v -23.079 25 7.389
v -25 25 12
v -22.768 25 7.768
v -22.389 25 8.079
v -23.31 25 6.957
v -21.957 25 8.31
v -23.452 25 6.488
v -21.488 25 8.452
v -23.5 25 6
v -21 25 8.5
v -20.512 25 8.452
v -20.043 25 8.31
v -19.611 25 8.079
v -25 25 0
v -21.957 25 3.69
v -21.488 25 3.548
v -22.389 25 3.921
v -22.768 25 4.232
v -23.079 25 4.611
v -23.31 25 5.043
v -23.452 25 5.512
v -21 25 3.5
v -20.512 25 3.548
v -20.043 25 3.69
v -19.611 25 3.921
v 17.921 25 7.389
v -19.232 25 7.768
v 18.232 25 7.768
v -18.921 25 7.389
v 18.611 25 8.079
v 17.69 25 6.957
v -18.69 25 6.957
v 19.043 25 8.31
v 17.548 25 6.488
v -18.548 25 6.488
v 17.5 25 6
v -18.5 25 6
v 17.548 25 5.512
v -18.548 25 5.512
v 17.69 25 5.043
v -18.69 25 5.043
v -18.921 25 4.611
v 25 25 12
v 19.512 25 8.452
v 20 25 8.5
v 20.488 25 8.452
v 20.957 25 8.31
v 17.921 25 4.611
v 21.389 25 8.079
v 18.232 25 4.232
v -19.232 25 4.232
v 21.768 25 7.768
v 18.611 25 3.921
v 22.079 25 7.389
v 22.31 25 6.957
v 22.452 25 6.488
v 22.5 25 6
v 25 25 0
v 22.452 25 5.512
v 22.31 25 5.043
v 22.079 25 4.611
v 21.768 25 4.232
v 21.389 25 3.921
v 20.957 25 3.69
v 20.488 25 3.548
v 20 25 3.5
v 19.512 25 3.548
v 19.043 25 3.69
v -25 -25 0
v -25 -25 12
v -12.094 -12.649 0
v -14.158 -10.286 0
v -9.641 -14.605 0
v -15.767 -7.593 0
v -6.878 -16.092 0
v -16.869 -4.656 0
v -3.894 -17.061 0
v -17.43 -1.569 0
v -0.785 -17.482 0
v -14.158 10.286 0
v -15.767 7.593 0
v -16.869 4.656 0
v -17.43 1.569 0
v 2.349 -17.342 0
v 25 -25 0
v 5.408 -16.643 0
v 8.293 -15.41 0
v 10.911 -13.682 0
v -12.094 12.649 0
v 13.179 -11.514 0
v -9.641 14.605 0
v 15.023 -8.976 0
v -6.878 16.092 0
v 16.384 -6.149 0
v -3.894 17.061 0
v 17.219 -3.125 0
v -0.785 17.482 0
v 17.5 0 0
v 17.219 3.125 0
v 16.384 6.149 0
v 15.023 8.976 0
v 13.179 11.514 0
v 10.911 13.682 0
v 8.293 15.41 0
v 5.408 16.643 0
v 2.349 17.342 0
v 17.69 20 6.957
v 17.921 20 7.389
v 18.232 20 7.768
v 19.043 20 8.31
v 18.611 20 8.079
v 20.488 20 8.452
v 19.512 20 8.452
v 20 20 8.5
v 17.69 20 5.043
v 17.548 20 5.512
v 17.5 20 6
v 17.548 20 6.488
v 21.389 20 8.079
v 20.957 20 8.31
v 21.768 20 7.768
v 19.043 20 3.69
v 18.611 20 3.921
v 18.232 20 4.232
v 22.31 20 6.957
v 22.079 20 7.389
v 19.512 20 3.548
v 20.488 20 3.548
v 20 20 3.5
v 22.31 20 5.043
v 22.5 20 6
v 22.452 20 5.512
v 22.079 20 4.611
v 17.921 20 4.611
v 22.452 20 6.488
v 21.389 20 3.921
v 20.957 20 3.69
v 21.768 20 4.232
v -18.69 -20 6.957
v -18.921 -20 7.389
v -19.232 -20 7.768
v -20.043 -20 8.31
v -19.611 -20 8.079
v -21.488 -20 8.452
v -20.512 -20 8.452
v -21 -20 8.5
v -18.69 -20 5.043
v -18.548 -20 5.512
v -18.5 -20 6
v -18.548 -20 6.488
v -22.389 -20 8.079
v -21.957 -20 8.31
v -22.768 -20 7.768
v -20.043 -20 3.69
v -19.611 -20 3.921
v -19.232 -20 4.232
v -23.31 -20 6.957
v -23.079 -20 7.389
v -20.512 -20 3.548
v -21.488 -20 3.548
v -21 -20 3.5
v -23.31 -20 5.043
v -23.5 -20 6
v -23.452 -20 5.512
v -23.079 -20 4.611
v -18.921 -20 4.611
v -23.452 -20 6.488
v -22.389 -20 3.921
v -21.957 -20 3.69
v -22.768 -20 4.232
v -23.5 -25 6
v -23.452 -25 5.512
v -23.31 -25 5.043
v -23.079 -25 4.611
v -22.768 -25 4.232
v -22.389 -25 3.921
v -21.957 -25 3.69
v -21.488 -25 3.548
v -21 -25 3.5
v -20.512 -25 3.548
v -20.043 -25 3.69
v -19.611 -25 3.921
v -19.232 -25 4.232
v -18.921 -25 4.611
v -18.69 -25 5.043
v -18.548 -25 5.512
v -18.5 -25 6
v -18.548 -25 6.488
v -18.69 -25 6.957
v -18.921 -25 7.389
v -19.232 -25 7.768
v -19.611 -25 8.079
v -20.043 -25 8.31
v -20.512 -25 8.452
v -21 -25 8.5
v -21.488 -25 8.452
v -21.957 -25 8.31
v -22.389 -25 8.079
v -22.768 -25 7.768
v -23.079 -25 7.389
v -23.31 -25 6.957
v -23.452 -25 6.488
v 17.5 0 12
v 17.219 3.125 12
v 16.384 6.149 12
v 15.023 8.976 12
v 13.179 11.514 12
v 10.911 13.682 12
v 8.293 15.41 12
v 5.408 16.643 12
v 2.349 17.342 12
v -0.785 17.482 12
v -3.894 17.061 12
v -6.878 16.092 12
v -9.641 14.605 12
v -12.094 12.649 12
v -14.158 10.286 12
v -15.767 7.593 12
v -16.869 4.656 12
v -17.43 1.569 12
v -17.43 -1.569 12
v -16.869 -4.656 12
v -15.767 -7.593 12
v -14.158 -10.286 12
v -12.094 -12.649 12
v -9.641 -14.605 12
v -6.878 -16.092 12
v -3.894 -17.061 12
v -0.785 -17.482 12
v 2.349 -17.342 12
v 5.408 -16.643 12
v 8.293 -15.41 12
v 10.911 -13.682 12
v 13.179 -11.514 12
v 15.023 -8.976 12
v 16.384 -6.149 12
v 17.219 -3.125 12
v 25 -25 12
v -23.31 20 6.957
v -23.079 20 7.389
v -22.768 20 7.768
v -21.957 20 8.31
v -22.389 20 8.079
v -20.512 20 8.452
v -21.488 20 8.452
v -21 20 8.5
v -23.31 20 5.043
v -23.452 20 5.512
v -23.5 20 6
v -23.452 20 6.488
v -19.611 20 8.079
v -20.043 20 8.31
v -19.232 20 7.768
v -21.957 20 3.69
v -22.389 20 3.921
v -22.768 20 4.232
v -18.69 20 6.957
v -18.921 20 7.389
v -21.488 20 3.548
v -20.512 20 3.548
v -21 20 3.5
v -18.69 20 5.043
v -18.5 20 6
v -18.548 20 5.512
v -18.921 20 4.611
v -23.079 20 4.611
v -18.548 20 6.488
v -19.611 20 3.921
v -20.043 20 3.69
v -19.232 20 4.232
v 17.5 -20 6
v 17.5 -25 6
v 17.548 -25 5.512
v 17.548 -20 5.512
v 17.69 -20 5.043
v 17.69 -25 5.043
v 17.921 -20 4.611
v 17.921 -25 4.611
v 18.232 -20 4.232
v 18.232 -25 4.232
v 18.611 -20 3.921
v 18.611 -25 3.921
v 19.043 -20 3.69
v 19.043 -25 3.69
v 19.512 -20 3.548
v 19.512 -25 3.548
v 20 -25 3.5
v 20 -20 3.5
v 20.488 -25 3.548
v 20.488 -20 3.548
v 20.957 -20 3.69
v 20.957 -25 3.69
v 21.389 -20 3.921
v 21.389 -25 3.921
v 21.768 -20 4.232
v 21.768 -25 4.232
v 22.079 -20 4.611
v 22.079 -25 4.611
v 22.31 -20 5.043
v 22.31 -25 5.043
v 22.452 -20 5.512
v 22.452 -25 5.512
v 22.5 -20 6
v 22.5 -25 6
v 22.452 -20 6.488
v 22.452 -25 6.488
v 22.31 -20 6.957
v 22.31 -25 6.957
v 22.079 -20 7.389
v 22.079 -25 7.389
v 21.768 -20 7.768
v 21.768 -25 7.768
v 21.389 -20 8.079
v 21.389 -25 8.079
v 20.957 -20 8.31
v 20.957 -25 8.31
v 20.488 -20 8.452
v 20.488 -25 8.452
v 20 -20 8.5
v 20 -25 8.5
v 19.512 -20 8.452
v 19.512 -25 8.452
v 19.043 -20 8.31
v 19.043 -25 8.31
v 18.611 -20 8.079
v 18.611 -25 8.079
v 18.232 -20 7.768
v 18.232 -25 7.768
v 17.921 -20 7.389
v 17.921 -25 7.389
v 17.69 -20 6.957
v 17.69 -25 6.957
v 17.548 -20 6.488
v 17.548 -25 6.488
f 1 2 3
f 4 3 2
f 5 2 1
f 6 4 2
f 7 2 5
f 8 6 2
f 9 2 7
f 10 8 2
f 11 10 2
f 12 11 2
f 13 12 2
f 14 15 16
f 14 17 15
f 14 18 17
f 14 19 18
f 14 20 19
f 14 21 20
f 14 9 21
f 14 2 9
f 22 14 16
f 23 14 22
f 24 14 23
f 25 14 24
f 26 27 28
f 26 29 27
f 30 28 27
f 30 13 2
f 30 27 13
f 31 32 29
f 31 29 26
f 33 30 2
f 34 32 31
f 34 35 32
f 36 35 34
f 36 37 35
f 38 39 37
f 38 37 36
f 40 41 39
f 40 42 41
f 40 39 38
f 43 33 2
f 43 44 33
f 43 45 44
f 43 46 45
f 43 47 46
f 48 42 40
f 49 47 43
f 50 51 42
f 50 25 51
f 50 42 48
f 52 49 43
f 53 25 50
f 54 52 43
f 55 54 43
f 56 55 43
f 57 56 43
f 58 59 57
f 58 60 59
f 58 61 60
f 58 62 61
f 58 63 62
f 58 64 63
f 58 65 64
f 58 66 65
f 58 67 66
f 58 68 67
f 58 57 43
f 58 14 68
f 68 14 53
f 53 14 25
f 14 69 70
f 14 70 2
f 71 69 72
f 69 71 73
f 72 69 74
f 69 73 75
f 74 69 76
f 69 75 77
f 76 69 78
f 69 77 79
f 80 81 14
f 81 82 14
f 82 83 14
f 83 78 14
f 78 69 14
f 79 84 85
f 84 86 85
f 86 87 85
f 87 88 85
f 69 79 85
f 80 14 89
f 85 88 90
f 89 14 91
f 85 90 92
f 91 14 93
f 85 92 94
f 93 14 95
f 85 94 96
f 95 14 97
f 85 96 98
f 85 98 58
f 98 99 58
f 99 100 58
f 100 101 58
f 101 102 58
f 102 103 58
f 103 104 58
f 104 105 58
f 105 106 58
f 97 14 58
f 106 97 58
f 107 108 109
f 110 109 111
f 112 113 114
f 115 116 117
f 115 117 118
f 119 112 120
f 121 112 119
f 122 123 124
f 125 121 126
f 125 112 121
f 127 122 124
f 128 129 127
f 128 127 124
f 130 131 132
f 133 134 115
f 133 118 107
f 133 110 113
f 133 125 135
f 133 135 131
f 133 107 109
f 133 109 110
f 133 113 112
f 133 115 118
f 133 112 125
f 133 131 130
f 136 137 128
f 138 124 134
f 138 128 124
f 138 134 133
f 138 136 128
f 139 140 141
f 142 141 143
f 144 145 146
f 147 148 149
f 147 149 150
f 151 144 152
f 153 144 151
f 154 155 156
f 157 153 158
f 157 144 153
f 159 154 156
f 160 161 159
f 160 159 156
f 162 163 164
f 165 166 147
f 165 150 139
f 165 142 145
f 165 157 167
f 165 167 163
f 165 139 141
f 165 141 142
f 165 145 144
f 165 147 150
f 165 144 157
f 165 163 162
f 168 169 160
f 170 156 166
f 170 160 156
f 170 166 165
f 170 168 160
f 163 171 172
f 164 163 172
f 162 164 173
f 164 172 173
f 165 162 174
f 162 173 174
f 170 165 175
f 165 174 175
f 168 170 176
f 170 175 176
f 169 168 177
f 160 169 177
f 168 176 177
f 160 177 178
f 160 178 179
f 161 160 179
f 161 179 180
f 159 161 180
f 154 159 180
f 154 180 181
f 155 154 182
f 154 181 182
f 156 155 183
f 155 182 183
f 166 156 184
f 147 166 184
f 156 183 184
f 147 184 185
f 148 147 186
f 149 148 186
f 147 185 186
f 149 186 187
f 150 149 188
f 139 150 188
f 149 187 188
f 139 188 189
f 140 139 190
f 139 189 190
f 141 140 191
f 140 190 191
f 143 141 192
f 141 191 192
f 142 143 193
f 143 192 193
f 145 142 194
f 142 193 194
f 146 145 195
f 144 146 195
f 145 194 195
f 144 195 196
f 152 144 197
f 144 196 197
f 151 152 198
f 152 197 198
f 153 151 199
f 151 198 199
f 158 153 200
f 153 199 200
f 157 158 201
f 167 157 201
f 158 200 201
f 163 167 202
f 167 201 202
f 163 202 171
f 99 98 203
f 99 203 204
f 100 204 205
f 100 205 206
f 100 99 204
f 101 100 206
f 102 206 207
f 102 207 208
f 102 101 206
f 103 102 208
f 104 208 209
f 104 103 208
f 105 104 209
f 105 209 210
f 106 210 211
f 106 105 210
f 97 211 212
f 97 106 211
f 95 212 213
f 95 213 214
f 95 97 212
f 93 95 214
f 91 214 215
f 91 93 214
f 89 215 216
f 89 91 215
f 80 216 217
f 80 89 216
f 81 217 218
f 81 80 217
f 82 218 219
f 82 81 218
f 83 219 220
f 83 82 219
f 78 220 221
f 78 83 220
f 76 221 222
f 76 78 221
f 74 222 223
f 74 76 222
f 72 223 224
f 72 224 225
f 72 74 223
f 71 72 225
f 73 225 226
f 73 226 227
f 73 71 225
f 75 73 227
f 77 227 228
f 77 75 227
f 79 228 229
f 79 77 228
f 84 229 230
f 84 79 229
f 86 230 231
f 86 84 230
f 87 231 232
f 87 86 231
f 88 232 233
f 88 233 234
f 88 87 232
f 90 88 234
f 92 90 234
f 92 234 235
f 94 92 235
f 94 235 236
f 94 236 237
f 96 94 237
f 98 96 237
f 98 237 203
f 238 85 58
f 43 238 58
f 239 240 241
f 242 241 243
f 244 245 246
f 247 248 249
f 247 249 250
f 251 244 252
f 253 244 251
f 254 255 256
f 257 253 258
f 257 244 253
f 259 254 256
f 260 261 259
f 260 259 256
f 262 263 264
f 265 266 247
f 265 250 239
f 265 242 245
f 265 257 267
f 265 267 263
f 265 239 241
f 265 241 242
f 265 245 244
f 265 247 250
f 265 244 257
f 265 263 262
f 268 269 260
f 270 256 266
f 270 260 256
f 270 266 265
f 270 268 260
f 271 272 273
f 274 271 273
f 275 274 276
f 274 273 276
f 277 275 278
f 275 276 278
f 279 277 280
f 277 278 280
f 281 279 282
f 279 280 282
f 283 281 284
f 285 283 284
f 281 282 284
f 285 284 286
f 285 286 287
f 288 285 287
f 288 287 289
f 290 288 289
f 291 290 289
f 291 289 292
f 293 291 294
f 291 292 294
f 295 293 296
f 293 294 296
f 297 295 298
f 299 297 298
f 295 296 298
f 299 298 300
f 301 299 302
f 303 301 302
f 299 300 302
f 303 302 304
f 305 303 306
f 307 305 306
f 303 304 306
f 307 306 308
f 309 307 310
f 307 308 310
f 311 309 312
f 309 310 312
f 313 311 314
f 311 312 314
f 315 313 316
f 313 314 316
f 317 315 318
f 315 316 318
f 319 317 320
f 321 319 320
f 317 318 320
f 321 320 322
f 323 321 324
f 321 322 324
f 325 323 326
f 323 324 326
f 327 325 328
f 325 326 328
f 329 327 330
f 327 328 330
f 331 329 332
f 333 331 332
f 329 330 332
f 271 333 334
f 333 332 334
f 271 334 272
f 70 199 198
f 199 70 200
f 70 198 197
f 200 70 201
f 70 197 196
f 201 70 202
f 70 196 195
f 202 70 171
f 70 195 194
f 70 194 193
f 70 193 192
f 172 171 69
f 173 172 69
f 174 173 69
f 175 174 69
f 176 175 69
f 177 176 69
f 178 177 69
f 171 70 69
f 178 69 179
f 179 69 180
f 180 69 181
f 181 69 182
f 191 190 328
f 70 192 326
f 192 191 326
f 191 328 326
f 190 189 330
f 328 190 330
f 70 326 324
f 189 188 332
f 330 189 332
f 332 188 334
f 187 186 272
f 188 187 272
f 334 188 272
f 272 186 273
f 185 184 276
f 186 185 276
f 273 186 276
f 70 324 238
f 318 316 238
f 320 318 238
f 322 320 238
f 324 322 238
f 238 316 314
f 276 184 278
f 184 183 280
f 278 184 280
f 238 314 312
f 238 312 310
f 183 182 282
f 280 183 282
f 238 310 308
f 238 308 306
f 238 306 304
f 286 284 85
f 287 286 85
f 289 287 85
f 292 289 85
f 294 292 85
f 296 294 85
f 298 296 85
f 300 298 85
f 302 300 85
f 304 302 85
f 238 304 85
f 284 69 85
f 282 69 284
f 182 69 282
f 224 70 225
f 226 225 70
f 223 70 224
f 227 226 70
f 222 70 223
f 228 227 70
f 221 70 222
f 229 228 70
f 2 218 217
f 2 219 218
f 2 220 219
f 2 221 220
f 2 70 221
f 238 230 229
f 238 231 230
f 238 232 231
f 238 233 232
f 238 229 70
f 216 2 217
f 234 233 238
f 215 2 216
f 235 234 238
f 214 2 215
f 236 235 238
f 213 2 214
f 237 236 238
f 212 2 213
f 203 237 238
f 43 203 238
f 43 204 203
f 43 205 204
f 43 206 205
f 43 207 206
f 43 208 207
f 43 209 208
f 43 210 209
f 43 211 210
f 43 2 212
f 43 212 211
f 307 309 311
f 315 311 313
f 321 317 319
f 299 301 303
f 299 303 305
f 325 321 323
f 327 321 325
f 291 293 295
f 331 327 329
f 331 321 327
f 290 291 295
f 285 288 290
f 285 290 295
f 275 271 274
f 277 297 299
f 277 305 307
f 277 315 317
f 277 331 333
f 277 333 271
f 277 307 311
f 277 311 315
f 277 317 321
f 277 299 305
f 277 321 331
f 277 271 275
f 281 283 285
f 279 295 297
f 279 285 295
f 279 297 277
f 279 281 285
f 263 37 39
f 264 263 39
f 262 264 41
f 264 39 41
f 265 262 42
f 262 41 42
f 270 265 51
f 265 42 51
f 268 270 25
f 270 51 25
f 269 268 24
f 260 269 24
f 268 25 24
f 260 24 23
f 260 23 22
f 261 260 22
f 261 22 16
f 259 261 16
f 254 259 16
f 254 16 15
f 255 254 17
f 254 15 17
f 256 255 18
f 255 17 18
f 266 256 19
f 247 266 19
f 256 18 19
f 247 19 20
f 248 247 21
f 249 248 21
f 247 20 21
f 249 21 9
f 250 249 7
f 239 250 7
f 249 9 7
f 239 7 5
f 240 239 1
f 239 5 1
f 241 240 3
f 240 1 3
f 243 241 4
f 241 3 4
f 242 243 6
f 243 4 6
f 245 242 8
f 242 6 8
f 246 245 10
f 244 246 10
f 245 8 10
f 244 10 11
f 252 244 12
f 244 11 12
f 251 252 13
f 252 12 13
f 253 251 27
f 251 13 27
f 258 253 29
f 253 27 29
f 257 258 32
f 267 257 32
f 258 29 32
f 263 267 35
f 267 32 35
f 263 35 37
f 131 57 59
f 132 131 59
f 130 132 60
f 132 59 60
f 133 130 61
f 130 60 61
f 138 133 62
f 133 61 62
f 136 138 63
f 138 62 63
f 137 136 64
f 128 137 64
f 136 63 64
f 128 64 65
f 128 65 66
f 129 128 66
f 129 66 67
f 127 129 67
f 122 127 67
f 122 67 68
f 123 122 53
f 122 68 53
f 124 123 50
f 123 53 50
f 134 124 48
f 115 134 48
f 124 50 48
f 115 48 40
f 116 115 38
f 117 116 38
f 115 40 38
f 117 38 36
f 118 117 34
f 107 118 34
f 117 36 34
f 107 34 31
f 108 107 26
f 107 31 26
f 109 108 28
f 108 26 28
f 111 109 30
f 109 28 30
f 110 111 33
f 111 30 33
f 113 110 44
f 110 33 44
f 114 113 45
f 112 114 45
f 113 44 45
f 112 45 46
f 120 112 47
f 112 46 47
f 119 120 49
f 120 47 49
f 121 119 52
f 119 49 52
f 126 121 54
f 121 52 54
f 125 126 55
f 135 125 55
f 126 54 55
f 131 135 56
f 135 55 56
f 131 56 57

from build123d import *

# Parameters (mm, degrees)
SCHIZZO1_W                   = 50
SCHIZZO1_H                   = 50
SCHIZZO1_R                   = 17.5
ESTRUSIONE_ESTRUSIONE1_DEPTH = 12
SCHIZZO2_R                   = 2.5
TAGLIO_ESTRUSIONE1_DEPTH     = 5
SCHIZZO3_R                   = 2.5
TAGLIO_ESTRUSIONE2_DEPTH     = 5


with BuildPart() as part:
    # Schizzo1 → Estrusione-Estrusione1 (new body)
    with BuildSketch(Plane.XY):
        Rectangle(SCHIZZO1_W, SCHIZZO1_H)
        Circle(SCHIZZO1_R, mode=Mode.SUBTRACT)
    extrude(amount=ESTRUSIONE_ESTRUSIONE1_DEPTH)

    # Schizzo2 → Taglio-Estrusione1 (cut)
    with BuildSketch(Plane(origin=(0, -25, 0), x_dir=(-1, 0, 0), z_dir=(0, -1, 0))):
        with Locations((21, -6)):
            Circle(SCHIZZO2_R)
        with Locations((-20, -6)):
            Circle(SCHIZZO2_R)
    extrude(amount=-TAGLIO_ESTRUSIONE1_DEPTH, mode=Mode.SUBTRACT)

    # Schizzo3 → Taglio-Estrusione2 (cut)
    with BuildSketch(Plane(origin=(0, 25, 0), x_dir=(1, 0, 0), z_dir=(0, 1, 0))):
        with Locations((20, -6)):
            Circle(SCHIZZO3_R)
        with Locations((-21, -6)):
            Circle(SCHIZZO3_R)
    extrude(amount=-TAGLIO_ESTRUSIONE2_DEPTH, mode=Mode.SUBTRACT)


solid = part.part
